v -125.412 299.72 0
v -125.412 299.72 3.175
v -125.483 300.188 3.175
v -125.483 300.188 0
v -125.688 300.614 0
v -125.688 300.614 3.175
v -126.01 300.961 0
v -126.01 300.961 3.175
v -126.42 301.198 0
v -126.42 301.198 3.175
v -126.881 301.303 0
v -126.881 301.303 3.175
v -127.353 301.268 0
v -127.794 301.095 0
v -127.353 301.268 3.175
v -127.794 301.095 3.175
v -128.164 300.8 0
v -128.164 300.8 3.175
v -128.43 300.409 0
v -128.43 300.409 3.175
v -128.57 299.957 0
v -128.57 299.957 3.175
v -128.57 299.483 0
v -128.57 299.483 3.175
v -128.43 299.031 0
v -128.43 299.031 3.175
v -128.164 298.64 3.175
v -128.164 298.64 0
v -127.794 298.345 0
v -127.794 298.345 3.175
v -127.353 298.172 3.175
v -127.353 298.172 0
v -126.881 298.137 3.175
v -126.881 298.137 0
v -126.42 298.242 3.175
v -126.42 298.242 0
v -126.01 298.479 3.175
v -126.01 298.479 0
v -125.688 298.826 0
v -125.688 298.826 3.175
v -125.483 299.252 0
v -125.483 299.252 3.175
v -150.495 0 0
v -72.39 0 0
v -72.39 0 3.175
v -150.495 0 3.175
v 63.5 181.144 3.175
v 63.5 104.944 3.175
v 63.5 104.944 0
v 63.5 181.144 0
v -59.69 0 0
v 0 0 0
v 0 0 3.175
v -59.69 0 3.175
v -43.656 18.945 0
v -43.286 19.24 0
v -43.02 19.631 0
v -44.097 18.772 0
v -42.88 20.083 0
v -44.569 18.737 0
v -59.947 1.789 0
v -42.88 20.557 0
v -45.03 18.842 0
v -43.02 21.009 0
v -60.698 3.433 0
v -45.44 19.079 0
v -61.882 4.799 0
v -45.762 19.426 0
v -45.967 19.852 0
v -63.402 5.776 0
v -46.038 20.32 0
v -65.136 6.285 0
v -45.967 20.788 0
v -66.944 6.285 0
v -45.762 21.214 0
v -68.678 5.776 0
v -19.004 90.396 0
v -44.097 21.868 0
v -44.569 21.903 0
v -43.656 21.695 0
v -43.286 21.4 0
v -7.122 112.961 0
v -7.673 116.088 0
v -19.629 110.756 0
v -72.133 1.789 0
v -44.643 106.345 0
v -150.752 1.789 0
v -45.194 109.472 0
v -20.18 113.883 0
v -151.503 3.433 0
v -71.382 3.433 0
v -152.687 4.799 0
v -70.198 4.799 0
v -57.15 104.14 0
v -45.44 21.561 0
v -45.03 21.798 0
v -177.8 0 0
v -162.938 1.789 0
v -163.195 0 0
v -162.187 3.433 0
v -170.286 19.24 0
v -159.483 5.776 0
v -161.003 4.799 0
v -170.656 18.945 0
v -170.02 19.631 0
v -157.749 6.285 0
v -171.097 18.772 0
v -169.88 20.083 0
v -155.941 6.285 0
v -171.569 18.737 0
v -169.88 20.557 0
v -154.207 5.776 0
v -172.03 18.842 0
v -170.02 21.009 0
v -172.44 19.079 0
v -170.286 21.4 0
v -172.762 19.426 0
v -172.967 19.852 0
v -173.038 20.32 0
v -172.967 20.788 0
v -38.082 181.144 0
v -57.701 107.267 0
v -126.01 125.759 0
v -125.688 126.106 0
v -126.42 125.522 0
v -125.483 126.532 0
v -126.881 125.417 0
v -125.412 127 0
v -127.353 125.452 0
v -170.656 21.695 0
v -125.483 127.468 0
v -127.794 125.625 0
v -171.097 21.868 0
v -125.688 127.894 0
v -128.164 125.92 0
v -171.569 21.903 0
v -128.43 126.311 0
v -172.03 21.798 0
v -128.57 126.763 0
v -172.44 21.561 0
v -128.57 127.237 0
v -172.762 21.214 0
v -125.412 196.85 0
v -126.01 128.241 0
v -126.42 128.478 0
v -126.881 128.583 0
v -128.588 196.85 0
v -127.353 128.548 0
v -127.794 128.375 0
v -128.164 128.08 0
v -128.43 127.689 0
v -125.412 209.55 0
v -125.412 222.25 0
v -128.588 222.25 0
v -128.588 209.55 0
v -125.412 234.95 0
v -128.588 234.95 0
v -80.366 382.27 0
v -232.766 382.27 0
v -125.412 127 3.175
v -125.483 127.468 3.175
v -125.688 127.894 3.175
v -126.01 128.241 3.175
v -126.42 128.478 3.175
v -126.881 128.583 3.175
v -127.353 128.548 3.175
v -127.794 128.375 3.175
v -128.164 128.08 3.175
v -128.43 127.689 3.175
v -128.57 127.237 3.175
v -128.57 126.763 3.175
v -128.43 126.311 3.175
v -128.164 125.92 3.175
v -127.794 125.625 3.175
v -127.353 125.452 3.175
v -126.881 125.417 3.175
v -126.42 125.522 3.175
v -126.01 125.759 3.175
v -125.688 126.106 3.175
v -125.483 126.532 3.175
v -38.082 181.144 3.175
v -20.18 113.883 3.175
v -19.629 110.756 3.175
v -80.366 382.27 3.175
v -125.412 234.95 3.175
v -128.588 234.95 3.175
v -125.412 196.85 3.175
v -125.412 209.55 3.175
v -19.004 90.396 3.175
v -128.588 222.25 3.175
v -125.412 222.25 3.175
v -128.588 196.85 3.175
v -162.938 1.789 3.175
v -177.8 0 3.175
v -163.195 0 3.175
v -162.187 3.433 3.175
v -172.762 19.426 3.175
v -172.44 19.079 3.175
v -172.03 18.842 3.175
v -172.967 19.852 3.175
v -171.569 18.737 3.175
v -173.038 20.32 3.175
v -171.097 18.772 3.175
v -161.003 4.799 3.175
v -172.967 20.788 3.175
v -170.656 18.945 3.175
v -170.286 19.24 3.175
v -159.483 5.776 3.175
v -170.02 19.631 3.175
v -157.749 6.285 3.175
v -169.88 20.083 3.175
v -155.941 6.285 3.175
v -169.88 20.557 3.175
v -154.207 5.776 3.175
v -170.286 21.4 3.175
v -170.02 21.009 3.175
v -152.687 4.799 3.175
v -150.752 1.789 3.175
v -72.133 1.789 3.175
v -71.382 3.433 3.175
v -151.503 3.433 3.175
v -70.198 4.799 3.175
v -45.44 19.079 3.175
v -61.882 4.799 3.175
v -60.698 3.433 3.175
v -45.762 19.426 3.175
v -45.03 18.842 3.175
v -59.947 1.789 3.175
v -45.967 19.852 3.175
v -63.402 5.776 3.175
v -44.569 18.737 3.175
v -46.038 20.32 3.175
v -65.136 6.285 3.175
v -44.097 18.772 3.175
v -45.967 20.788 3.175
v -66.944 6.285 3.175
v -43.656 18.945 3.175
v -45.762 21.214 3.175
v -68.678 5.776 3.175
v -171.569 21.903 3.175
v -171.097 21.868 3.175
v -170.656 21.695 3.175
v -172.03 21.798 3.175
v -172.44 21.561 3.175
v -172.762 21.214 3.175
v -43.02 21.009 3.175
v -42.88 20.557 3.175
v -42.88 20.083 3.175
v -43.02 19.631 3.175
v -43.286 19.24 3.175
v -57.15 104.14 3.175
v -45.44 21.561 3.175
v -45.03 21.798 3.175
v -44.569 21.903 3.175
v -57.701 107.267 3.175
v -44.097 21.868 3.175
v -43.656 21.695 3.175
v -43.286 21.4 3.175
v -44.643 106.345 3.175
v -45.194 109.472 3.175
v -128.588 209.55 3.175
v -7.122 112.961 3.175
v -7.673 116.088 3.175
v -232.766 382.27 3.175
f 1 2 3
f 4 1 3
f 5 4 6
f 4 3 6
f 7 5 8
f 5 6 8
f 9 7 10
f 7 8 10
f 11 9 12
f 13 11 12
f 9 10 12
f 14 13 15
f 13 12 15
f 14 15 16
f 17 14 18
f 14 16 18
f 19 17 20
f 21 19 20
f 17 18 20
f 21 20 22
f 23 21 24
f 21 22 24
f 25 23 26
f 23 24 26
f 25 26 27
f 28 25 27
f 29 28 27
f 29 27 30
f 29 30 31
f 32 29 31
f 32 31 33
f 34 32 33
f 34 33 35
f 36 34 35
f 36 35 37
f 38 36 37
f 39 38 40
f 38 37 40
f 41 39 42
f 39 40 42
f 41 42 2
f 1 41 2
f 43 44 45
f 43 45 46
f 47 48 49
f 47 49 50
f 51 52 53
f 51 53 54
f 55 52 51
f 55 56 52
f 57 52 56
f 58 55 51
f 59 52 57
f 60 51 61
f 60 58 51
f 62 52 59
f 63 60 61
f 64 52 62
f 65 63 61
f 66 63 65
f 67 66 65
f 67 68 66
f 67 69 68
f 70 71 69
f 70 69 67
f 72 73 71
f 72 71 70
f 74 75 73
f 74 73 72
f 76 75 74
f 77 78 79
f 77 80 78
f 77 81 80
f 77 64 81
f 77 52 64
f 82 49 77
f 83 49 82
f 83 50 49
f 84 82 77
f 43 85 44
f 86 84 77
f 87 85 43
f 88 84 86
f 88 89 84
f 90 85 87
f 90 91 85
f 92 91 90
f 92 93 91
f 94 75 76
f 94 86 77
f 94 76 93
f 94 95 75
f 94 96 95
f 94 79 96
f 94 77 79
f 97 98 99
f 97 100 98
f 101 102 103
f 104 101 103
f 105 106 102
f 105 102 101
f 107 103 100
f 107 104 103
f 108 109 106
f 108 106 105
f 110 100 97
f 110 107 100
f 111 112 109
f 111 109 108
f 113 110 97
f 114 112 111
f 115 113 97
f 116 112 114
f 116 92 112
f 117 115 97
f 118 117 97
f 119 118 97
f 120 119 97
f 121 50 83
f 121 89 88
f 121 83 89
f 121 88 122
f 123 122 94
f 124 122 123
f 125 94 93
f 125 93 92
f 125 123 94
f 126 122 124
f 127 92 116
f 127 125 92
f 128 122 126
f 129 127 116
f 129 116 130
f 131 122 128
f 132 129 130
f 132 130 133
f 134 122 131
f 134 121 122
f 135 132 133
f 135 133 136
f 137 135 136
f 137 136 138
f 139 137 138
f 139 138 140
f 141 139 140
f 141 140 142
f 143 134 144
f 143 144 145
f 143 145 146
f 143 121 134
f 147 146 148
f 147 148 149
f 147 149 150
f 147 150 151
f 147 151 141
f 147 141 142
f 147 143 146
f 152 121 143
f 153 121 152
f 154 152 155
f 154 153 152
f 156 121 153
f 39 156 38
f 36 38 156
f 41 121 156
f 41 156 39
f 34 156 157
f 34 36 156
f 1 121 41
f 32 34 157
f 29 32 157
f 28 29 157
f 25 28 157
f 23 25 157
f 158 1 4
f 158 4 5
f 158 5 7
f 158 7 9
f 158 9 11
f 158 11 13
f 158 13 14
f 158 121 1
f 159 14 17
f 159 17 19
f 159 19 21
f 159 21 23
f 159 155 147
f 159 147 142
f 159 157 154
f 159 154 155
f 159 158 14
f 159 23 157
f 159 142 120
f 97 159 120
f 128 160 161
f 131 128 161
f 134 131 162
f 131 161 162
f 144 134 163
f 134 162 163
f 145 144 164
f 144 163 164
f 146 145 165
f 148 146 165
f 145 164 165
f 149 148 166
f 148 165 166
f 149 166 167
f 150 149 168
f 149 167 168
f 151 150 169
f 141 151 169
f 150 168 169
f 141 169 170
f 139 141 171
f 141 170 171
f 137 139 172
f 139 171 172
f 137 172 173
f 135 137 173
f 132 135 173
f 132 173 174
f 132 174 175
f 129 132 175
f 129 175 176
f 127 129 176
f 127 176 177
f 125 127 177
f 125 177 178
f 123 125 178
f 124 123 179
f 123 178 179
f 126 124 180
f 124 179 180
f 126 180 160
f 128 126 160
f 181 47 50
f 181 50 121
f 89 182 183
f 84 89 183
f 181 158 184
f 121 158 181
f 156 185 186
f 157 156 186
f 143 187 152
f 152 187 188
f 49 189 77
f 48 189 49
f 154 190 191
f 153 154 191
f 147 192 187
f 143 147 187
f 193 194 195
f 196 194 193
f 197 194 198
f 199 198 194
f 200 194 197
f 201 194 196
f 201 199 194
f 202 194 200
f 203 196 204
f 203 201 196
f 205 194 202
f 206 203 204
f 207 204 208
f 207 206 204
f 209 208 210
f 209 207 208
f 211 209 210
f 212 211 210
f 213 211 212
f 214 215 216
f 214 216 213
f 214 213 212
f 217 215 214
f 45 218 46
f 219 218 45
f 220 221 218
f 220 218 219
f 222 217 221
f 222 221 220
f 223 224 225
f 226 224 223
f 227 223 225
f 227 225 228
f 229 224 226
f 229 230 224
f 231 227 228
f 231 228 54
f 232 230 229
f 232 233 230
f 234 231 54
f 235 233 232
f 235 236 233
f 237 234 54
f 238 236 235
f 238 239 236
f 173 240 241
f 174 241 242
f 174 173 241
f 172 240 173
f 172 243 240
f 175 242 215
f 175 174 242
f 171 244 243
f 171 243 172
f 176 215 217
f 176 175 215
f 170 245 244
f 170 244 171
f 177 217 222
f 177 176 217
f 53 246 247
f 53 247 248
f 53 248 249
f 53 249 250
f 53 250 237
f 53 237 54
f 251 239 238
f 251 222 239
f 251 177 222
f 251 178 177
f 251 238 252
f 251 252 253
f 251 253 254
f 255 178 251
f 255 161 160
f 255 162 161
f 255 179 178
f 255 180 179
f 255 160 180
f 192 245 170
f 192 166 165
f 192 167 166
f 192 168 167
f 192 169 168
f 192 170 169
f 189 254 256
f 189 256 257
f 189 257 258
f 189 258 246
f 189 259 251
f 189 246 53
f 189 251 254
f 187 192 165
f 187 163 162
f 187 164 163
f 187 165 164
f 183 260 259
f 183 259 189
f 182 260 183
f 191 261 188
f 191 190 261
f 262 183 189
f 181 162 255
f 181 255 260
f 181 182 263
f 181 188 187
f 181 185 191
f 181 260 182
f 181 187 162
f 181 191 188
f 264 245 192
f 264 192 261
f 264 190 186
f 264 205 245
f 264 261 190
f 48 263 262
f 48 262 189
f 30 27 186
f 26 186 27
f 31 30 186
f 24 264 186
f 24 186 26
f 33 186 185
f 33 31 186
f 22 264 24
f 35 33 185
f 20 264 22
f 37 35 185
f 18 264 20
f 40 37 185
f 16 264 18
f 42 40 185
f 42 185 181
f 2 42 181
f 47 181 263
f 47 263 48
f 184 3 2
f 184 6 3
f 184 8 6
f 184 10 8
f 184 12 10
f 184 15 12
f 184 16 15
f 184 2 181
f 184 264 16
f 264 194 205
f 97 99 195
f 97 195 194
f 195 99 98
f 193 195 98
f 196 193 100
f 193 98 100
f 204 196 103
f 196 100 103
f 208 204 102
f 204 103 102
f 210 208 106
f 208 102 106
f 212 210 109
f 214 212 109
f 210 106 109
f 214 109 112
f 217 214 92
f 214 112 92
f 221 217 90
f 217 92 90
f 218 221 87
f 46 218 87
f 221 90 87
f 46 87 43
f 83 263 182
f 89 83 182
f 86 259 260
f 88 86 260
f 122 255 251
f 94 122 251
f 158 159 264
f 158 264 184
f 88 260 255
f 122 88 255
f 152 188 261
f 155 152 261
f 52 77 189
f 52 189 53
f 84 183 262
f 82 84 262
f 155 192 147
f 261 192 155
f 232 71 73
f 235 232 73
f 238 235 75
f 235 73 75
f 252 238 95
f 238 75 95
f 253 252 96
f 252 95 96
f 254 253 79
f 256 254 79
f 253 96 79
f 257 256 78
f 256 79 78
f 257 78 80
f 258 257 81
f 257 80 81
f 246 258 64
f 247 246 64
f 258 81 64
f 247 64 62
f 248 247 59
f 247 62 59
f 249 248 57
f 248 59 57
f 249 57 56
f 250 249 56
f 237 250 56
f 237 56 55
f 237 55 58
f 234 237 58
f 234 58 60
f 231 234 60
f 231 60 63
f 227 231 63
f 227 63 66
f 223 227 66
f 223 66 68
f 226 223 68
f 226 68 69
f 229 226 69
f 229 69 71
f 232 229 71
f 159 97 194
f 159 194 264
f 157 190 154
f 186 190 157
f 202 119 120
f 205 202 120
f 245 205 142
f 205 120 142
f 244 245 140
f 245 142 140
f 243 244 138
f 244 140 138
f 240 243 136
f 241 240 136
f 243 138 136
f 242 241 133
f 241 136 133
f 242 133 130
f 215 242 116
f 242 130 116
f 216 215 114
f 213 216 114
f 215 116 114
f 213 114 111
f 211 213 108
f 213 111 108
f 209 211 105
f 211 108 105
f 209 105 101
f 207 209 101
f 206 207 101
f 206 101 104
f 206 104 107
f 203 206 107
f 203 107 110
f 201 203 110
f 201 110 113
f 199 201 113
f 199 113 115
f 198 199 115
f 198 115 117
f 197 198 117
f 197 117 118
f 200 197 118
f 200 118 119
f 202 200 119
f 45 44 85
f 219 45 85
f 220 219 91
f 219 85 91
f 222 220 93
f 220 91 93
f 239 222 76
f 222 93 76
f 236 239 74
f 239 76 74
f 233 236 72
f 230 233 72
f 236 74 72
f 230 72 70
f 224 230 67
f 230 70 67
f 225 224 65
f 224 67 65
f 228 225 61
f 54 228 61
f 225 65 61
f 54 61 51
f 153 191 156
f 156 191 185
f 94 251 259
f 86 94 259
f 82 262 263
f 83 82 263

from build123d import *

# Parameters (mm, degrees)
BOSS_EXTRUDE1_DEPTH = 3.175
SKETCH2_R           = 1.5875
CUT_EXTRUDE1_DEPTH  = 3.175
BOSS_EXTRUDE2_DEPTH = 3.175
CUT_EXTRUDE2_DEPTH  = 3.175
SKETCH5_W           = 1.5875
SKETCH5_H           = 12.7
CUT_EXTRUDE3_DEPTH  = 10.16
LPATTERN1_COUNT     = 2
LPATTERN1_PITCH     = 25.4
SKETCH9_R           = 1.5875
CUT_EXTRUDE7_DEPTH  = 7.62
SKETCH10_R          = 6.35
CUT_EXTRUDE8_DEPTH  = 5.08


with BuildPart() as part:
    # Sketch1 → Boss-Extrude1 (new body)
    with BuildSketch(Plane.XY):
        Polygon((0, 0), (-177.8, 0), (-232.7656, 382.27), (-80.3656, 382.27), align=None)
    extrude(amount=BOSS_EXTRUDE1_DEPTH)

    # Sketch2 → Cut-Extrude1 (cut)
    with BuildSketch(Plane.XY.offset(3.175)):
        with Locations((-127, 127)):
            Circle(SKETCH2_R)
        with Locations((-127, 299.72)):
            Circle(SKETCH2_R)
    extrude(amount=-CUT_EXTRUDE1_DEPTH, mode=Mode.SUBTRACT)

    # Sketch3 → Boss-Extrude2 (add)
    with BuildSketch(Plane.XY.offset(3.175)):
        Polygon((-63.5, 82.55), (63.5, 104.94352655), (63.5, 181.14352655), (-63.5, 181.14352655), align=None)
    extrude(amount=-BOSS_EXTRUDE2_DEPTH)

    # Sketch4 → Cut-Extrude2 (cut)
    with BuildSketch(Plane.XY.offset(3.175)):
        Polygon((-57.15, 104.14), (-44.642941537, 106.345331856), (-45.194274501, 109.472096472), (-57.701332964, 107.266764616), align=None)
        Polygon((-19.62882461, 110.755995569), (-7.121766147, 112.961327425), (-7.673099111, 116.088092041), (-20.180157574, 113.882760185), align=None)
    extrude(amount=-CUT_EXTRUDE2_DEPTH, mode=Mode.SUBTRACT)

    # Sketch5 → Cut-Extrude3 (cut)
    with BuildSketch(Plane.XY.offset(3.175)):
        with Locations((-126.20625, 203.2)):
            Rectangle(SKETCH5_W, SKETCH5_H)
        with Locations((-127.79375, 203.2)):
            Rectangle(SKETCH5_W, SKETCH5_H)
    cut_extrude3 = extrude(amount=-CUT_EXTRUDE3_DEPTH, mode=Mode.SUBTRACT)

    # LPattern1: Cut-Extrude3 ×2
    with Locations(*[(0, i * LPATTERN1_PITCH, 0) for i in range(1, LPATTERN1_COUNT)]):
        add(cut_extrude3, mode=Mode.SUBTRACT)

    # Sketch9 → Cut-Extrude7 (cut)
    with BuildSketch(Plane(origin=(0, 0, 0), x_dir=(-1, 0, 0), z_dir=(0, 0, -1))):
        with Locations((171.45, 20.32)):
            Circle(SKETCH9_R)
        with Locations((44.45, 20.32)):
            Circle(SKETCH9_R)
    extrude(amount=-CUT_EXTRUDE7_DEPTH, mode=Mode.SUBTRACT)

    # Sketch10 → Cut-Extrude8 (cut)
    with BuildSketch(Plane(origin=(0, 0, 0), x_dir=(-1, 0, 0), z_dir=(0, 0, -1))):
        with Locations((156.845, 0)):
            Circle(SKETCH10_R)
        with Locations((66.04, 0)):
            Circle(SKETCH10_R)
    extrude(amount=-CUT_EXTRUDE8_DEPTH, mode=Mode.SUBTRACT)


solid = part.part
